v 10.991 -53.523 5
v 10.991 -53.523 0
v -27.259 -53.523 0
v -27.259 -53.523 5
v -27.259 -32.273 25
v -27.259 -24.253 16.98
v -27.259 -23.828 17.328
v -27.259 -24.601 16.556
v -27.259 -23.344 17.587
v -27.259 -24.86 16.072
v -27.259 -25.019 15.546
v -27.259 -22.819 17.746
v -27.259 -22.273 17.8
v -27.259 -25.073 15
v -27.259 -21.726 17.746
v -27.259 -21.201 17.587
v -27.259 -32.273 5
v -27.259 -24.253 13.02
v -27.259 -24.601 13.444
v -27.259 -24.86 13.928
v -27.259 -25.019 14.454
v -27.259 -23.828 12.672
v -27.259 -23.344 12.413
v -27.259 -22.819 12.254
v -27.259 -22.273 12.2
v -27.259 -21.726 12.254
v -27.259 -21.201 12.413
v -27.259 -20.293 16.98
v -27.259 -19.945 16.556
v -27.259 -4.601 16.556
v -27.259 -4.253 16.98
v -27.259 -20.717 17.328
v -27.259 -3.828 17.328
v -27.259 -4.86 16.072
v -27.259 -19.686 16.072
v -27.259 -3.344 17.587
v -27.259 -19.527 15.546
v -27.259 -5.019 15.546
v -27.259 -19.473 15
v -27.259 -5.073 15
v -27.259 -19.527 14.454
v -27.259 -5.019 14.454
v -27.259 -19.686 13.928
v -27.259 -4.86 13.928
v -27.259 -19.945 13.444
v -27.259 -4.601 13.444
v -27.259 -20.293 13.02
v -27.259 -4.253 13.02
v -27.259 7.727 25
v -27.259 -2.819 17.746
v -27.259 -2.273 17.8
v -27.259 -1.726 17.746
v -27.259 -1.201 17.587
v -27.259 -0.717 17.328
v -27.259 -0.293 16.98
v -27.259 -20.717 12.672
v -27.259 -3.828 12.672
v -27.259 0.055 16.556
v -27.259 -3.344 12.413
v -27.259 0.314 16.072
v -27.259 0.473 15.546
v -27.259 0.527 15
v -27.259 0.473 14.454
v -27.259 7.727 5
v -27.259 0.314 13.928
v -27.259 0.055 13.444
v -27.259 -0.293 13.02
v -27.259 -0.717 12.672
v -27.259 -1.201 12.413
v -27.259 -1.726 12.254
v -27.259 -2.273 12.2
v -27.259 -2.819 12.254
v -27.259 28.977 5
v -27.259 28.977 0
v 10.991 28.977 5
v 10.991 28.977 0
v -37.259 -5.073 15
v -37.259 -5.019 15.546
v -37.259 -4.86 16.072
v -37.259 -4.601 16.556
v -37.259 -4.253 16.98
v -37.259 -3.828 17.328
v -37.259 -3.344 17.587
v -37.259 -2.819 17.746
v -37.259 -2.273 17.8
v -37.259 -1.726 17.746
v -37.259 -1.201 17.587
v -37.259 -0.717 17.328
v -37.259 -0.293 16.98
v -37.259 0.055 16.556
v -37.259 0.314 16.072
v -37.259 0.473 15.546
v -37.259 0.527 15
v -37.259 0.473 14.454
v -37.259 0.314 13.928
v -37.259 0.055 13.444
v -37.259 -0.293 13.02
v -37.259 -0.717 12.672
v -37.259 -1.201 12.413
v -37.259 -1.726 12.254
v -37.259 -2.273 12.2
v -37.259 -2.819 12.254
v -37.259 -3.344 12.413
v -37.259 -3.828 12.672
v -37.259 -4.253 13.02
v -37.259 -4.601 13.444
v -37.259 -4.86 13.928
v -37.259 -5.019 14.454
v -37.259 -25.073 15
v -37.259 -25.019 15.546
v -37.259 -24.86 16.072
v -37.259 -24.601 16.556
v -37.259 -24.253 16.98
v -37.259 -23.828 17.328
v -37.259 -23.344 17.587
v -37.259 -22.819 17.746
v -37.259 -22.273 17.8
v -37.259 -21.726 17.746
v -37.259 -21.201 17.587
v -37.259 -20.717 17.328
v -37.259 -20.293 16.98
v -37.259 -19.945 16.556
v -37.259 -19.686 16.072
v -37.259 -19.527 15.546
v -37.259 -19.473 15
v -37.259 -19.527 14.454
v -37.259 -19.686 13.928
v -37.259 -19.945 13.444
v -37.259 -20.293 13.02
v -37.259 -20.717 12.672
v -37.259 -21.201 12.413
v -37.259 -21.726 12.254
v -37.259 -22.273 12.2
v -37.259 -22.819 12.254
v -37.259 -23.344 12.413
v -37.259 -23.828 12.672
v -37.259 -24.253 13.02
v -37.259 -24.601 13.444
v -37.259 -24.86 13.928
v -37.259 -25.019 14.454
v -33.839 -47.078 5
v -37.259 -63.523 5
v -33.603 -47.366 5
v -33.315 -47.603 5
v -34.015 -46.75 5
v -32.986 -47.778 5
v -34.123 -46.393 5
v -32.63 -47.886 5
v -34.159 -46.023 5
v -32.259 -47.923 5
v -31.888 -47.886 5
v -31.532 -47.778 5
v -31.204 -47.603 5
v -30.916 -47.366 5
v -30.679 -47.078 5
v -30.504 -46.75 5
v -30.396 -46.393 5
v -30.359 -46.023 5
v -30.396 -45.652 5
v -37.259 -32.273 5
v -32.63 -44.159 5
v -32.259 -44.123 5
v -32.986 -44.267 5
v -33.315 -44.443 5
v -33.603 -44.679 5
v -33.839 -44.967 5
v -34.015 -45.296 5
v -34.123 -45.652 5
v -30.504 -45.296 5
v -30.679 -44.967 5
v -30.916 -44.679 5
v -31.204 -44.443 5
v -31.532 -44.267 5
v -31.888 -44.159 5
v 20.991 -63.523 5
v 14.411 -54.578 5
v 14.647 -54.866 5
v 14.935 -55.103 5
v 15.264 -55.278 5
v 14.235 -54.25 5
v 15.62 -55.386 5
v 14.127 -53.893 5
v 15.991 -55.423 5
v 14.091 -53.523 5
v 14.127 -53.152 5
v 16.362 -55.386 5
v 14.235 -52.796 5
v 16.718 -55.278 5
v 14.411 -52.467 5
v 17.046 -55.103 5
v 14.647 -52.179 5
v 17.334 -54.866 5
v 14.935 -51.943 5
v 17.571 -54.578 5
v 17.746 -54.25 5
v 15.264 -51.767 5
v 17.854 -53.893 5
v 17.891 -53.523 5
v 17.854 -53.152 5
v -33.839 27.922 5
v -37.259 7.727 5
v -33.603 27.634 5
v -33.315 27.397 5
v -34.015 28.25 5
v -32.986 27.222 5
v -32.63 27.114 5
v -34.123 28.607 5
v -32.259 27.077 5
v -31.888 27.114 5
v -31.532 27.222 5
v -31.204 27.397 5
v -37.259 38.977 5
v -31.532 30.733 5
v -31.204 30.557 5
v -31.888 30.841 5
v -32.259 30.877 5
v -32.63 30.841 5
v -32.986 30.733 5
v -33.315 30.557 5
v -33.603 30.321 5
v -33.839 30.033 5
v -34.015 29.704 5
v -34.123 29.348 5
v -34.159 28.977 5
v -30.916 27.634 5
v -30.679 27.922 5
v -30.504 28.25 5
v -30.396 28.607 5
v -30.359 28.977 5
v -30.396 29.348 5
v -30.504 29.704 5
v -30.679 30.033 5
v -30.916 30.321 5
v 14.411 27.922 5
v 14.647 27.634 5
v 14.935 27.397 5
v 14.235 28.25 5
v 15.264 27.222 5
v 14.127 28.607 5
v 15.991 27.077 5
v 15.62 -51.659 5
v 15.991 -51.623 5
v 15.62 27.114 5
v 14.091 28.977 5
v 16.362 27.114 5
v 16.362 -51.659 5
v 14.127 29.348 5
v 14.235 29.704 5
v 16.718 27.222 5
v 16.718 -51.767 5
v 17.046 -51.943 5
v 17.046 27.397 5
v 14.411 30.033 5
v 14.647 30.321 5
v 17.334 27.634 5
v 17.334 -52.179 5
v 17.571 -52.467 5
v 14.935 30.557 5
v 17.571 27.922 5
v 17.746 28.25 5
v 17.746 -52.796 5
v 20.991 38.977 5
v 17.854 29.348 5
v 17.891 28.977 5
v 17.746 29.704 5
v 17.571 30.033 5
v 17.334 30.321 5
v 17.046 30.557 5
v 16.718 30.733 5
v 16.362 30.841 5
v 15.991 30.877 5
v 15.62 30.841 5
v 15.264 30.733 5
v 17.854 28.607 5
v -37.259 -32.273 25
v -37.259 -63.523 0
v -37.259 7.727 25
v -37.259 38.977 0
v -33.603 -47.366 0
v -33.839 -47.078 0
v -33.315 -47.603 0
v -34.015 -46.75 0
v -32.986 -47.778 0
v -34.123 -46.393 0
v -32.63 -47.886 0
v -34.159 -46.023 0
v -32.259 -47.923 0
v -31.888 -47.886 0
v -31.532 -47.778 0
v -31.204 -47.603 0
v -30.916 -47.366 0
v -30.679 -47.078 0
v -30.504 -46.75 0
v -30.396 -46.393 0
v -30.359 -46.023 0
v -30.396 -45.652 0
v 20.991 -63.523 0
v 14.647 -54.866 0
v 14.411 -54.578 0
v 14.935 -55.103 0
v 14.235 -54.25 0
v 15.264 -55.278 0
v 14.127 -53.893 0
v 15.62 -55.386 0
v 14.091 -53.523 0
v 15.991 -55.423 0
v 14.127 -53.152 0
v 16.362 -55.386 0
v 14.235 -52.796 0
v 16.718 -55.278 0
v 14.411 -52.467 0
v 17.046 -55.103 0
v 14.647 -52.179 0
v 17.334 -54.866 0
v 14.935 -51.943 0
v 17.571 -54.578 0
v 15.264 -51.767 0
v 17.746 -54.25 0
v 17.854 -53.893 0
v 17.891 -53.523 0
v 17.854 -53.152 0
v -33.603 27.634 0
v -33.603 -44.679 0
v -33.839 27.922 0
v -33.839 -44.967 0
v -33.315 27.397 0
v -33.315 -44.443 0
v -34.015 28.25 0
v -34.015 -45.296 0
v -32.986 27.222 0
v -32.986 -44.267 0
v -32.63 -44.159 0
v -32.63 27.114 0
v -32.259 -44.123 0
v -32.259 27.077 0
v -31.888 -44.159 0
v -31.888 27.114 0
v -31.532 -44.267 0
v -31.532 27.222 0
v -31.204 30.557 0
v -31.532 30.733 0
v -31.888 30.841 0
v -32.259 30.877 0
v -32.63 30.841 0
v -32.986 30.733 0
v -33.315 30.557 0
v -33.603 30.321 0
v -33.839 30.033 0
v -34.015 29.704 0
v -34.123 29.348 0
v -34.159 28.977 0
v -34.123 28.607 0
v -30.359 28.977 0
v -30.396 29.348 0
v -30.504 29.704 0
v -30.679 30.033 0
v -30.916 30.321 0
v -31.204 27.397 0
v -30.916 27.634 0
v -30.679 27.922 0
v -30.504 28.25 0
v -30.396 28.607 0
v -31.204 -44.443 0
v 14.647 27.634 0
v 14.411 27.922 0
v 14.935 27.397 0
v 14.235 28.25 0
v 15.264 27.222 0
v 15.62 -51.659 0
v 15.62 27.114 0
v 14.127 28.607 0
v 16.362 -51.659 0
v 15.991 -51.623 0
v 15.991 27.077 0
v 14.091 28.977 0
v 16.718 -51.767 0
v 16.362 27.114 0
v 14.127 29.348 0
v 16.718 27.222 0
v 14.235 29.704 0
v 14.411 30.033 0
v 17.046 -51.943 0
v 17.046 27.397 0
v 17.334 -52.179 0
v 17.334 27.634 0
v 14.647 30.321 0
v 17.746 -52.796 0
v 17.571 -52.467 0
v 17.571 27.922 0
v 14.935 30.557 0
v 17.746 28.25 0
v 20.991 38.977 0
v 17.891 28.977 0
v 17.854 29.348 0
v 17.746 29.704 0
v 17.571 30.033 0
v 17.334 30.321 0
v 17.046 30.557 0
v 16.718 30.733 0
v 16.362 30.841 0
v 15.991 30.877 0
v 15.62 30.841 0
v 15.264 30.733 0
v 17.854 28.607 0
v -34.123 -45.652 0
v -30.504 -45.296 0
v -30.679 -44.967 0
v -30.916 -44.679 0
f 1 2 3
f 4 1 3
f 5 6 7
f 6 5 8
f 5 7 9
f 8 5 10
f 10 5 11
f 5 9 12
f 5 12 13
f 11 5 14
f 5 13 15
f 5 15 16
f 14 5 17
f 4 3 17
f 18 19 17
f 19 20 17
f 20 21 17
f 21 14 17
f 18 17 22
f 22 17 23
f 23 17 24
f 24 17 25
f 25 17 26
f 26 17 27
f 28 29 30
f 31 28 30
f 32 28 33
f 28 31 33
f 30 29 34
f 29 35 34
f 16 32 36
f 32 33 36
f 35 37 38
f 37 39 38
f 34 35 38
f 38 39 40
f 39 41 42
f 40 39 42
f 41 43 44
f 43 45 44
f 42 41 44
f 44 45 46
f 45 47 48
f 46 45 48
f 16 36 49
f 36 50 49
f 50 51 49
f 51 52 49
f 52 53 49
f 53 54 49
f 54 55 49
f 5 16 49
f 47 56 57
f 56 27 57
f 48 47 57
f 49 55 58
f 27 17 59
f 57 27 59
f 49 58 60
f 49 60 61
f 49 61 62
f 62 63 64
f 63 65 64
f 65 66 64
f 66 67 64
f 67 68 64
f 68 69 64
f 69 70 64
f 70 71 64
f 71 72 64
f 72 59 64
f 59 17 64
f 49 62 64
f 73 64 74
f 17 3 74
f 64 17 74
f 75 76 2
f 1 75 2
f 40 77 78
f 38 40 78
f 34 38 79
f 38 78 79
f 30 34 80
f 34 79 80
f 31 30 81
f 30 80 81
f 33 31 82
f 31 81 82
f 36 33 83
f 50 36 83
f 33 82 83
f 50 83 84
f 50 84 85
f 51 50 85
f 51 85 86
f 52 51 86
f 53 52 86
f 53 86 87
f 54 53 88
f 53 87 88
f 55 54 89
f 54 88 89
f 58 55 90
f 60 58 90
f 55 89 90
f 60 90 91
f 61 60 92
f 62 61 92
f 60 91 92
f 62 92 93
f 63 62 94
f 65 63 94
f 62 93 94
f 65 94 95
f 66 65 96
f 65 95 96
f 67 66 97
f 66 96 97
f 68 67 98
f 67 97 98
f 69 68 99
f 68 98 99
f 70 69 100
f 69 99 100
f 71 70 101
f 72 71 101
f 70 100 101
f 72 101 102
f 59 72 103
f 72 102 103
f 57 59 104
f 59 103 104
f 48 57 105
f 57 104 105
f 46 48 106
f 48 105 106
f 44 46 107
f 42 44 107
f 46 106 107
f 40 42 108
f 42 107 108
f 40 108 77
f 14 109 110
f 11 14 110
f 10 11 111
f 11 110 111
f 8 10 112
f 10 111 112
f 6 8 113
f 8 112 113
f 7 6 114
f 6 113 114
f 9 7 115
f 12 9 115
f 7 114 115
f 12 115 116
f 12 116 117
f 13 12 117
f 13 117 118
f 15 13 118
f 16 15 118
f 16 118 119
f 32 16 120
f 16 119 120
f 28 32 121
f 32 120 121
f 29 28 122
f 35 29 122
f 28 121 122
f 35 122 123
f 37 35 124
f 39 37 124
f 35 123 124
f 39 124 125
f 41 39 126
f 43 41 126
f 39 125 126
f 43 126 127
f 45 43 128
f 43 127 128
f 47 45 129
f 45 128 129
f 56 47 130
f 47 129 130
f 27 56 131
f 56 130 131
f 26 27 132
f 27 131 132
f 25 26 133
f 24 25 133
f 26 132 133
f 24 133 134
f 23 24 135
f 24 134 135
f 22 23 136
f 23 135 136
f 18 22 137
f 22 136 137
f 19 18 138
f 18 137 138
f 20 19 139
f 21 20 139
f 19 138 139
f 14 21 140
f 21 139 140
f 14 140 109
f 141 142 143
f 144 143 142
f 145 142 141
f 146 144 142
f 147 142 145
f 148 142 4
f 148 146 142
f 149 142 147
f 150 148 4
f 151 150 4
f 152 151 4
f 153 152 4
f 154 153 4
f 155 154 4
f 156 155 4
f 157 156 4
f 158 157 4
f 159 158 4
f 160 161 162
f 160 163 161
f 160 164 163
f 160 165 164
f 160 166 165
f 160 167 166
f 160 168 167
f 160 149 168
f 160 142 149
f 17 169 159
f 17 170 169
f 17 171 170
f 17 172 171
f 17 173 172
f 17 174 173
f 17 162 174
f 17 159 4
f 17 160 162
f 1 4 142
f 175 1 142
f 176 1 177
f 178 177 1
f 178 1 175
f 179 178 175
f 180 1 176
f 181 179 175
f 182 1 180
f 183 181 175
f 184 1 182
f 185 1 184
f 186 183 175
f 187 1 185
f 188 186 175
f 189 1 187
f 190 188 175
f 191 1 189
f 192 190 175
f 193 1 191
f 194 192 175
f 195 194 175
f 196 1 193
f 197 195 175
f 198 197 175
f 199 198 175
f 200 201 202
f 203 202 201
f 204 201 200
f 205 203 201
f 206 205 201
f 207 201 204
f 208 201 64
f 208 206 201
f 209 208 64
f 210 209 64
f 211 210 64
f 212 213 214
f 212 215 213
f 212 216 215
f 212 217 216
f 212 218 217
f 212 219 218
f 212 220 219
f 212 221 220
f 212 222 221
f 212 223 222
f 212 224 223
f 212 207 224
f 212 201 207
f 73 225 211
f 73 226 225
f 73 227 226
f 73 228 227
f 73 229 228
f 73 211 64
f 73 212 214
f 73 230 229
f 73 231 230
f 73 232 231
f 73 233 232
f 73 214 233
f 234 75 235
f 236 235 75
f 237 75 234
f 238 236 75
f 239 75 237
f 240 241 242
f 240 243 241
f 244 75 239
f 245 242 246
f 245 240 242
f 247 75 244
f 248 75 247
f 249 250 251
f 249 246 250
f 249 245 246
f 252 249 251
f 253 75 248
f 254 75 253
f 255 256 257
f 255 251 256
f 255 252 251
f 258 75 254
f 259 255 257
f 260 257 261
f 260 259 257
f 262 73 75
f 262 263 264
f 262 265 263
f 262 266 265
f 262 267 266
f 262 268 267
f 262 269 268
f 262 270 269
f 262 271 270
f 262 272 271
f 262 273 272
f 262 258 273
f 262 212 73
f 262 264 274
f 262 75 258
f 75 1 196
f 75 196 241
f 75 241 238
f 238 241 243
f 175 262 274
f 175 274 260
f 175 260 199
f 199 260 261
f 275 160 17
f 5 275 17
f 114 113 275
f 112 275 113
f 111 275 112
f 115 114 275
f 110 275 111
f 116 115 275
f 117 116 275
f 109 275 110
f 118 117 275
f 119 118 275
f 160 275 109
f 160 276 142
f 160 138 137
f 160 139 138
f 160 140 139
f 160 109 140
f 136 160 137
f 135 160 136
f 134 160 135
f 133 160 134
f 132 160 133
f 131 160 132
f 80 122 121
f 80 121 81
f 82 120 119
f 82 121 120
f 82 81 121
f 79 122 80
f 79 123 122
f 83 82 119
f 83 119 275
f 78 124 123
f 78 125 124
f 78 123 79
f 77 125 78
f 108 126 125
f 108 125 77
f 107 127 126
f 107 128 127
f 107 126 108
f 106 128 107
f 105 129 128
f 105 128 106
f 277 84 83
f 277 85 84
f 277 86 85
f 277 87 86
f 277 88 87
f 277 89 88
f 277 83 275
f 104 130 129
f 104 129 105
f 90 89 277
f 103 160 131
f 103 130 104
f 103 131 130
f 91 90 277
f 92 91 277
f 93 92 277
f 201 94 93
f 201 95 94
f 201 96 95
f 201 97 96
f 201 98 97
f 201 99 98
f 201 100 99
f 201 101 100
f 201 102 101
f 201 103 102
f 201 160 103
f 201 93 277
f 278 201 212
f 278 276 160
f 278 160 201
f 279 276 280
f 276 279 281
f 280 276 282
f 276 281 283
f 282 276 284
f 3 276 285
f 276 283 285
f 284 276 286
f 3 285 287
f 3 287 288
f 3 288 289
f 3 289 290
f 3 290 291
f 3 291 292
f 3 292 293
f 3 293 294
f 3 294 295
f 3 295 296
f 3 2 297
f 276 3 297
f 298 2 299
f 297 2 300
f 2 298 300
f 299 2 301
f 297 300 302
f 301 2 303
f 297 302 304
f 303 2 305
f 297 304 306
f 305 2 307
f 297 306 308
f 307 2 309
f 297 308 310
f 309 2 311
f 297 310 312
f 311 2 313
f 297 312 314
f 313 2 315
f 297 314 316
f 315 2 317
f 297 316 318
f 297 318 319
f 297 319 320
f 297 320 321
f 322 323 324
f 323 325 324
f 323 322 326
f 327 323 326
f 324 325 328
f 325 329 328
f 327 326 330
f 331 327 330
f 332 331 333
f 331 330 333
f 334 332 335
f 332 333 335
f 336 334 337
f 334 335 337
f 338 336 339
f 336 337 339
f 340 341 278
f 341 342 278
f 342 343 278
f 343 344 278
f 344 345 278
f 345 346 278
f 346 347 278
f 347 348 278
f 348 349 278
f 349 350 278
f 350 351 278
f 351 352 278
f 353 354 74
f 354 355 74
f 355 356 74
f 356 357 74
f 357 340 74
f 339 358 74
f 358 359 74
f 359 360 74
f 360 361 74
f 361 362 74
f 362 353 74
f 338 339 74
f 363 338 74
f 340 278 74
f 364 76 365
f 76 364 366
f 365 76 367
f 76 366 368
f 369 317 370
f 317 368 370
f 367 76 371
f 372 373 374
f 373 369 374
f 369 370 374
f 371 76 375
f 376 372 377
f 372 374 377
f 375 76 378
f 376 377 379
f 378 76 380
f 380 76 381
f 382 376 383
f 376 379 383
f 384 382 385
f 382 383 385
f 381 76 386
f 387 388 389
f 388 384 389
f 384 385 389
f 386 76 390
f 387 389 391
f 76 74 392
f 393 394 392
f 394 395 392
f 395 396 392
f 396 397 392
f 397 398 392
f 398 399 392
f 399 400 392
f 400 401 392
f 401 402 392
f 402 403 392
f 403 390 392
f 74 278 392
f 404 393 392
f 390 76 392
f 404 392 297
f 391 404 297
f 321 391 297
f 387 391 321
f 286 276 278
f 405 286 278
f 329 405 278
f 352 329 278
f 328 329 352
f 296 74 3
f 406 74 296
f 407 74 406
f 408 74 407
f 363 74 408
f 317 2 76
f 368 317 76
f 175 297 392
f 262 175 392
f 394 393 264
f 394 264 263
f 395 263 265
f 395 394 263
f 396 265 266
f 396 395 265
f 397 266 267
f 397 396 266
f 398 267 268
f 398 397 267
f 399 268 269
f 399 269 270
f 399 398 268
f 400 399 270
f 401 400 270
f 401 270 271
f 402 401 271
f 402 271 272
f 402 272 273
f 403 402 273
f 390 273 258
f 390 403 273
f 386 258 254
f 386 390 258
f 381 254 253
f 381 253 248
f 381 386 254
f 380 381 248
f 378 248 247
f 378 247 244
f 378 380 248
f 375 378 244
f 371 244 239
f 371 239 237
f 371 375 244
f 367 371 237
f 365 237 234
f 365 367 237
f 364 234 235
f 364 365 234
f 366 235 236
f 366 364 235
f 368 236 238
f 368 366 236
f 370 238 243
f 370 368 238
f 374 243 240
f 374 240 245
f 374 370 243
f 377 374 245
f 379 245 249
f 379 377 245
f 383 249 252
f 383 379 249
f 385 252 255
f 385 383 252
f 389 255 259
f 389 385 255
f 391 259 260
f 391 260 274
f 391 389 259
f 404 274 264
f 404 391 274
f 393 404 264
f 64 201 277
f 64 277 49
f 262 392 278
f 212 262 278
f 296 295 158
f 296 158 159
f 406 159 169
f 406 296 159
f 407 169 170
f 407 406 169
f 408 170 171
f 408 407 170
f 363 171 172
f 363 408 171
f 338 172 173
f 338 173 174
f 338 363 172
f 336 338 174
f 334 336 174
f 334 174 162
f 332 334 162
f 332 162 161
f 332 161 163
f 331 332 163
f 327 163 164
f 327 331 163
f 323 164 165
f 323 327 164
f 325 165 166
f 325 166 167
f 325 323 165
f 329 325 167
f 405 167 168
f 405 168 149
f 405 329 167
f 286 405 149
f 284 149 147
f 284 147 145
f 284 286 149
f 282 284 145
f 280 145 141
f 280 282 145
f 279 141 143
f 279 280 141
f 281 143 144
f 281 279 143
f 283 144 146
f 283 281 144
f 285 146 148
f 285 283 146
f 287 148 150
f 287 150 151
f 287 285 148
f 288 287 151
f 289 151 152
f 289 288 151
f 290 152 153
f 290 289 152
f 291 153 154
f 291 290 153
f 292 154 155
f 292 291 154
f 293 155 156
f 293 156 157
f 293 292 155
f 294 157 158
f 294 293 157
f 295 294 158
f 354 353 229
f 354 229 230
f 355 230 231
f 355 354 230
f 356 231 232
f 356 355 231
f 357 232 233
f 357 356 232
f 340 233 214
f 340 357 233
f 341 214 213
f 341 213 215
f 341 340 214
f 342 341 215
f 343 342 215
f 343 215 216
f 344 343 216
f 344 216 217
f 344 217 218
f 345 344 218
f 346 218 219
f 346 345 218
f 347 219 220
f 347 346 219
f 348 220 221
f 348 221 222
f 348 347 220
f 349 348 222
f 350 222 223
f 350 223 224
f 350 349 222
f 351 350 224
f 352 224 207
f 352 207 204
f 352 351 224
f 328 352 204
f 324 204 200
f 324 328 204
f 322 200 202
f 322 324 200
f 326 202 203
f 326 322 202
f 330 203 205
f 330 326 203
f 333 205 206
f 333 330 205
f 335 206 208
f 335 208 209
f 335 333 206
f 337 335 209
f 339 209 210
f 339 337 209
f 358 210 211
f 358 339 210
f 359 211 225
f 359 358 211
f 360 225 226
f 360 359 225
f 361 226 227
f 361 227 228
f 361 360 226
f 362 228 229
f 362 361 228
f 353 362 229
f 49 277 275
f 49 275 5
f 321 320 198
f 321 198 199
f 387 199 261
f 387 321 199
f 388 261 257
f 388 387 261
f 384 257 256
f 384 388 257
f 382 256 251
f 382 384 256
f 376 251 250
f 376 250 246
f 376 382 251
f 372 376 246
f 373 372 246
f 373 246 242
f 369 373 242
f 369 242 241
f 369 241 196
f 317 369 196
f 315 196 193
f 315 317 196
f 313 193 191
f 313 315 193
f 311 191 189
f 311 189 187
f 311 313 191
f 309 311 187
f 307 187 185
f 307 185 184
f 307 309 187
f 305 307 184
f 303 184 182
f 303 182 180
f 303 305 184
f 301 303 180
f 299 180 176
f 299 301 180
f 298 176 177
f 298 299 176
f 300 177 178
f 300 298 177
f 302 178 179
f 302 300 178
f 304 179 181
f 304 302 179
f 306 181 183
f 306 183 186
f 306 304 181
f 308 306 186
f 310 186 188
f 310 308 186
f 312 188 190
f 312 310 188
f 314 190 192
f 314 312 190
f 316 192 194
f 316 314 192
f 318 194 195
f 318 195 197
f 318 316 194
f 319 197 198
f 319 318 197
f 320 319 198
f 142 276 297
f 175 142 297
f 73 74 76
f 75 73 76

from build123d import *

# Parameters (mm, degrees)
F0_R     = 1.9
F1_DEPTH = 5
F0_W     = 10
F0_H     = 40
F2_DEPTH = 25
F3_R     = 2.8
F4_DEPTH = 10


with BuildPart() as f1:
    # F0 (on Top) → F1 (new body)
    with BuildSketch(Plane.XY):
        Polygon((20.990842, 38.977277), (-37.259158, 38.977277), (-37.259158, 7.727277), (-27.259158, 7.727277), (-27.259158, 28.977277), (10.990842, 28.977277), (10.990842, -53.522723), (-27.259158, -53.522723), (-27.259158, -32.272723), (-37.259158, -32.272723), (-37.259158, -63.522723), (20.990842, -63.522723), align=None)
        with Locations((-32.259158, -46.022723)):
            Circle(F0_R, mode=Mode.SUBTRACT)
        with Locations((15.990842, -53.522723)):
            Circle(F0_R, mode=Mode.SUBTRACT)
        with Locations((-32.259158, 28.977277)):
            Circle(F0_R, mode=Mode.SUBTRACT)
        with Locations((15.990842, 28.977277)):
            Circle(F0_R, mode=Mode.SUBTRACT)
    extrude(amount=F1_DEPTH)

    # F0 (on Top) → F2 (join)
    with BuildSketch(Plane.XY):
        with Locations((-32.259158, -12.272723)):
            Rectangle(F0_W, F0_H)
    extrude(amount=F2_DEPTH)

    # F3 (on face) → F4 (cut, through all)
    with BuildSketch(Plane(origin=(-37.259158, 0, 0), x_dir=(0, -1, 0), z_dir=(-1, 0, 0))):
        with Locations((2.272723, 15)):
            Circle(F3_R)
        with Locations((22.272723, 15)):
            Circle(F3_R)
    extrude(amount=-F4_DEPTH, mode=Mode.SUBTRACT)


solid = f1.part
